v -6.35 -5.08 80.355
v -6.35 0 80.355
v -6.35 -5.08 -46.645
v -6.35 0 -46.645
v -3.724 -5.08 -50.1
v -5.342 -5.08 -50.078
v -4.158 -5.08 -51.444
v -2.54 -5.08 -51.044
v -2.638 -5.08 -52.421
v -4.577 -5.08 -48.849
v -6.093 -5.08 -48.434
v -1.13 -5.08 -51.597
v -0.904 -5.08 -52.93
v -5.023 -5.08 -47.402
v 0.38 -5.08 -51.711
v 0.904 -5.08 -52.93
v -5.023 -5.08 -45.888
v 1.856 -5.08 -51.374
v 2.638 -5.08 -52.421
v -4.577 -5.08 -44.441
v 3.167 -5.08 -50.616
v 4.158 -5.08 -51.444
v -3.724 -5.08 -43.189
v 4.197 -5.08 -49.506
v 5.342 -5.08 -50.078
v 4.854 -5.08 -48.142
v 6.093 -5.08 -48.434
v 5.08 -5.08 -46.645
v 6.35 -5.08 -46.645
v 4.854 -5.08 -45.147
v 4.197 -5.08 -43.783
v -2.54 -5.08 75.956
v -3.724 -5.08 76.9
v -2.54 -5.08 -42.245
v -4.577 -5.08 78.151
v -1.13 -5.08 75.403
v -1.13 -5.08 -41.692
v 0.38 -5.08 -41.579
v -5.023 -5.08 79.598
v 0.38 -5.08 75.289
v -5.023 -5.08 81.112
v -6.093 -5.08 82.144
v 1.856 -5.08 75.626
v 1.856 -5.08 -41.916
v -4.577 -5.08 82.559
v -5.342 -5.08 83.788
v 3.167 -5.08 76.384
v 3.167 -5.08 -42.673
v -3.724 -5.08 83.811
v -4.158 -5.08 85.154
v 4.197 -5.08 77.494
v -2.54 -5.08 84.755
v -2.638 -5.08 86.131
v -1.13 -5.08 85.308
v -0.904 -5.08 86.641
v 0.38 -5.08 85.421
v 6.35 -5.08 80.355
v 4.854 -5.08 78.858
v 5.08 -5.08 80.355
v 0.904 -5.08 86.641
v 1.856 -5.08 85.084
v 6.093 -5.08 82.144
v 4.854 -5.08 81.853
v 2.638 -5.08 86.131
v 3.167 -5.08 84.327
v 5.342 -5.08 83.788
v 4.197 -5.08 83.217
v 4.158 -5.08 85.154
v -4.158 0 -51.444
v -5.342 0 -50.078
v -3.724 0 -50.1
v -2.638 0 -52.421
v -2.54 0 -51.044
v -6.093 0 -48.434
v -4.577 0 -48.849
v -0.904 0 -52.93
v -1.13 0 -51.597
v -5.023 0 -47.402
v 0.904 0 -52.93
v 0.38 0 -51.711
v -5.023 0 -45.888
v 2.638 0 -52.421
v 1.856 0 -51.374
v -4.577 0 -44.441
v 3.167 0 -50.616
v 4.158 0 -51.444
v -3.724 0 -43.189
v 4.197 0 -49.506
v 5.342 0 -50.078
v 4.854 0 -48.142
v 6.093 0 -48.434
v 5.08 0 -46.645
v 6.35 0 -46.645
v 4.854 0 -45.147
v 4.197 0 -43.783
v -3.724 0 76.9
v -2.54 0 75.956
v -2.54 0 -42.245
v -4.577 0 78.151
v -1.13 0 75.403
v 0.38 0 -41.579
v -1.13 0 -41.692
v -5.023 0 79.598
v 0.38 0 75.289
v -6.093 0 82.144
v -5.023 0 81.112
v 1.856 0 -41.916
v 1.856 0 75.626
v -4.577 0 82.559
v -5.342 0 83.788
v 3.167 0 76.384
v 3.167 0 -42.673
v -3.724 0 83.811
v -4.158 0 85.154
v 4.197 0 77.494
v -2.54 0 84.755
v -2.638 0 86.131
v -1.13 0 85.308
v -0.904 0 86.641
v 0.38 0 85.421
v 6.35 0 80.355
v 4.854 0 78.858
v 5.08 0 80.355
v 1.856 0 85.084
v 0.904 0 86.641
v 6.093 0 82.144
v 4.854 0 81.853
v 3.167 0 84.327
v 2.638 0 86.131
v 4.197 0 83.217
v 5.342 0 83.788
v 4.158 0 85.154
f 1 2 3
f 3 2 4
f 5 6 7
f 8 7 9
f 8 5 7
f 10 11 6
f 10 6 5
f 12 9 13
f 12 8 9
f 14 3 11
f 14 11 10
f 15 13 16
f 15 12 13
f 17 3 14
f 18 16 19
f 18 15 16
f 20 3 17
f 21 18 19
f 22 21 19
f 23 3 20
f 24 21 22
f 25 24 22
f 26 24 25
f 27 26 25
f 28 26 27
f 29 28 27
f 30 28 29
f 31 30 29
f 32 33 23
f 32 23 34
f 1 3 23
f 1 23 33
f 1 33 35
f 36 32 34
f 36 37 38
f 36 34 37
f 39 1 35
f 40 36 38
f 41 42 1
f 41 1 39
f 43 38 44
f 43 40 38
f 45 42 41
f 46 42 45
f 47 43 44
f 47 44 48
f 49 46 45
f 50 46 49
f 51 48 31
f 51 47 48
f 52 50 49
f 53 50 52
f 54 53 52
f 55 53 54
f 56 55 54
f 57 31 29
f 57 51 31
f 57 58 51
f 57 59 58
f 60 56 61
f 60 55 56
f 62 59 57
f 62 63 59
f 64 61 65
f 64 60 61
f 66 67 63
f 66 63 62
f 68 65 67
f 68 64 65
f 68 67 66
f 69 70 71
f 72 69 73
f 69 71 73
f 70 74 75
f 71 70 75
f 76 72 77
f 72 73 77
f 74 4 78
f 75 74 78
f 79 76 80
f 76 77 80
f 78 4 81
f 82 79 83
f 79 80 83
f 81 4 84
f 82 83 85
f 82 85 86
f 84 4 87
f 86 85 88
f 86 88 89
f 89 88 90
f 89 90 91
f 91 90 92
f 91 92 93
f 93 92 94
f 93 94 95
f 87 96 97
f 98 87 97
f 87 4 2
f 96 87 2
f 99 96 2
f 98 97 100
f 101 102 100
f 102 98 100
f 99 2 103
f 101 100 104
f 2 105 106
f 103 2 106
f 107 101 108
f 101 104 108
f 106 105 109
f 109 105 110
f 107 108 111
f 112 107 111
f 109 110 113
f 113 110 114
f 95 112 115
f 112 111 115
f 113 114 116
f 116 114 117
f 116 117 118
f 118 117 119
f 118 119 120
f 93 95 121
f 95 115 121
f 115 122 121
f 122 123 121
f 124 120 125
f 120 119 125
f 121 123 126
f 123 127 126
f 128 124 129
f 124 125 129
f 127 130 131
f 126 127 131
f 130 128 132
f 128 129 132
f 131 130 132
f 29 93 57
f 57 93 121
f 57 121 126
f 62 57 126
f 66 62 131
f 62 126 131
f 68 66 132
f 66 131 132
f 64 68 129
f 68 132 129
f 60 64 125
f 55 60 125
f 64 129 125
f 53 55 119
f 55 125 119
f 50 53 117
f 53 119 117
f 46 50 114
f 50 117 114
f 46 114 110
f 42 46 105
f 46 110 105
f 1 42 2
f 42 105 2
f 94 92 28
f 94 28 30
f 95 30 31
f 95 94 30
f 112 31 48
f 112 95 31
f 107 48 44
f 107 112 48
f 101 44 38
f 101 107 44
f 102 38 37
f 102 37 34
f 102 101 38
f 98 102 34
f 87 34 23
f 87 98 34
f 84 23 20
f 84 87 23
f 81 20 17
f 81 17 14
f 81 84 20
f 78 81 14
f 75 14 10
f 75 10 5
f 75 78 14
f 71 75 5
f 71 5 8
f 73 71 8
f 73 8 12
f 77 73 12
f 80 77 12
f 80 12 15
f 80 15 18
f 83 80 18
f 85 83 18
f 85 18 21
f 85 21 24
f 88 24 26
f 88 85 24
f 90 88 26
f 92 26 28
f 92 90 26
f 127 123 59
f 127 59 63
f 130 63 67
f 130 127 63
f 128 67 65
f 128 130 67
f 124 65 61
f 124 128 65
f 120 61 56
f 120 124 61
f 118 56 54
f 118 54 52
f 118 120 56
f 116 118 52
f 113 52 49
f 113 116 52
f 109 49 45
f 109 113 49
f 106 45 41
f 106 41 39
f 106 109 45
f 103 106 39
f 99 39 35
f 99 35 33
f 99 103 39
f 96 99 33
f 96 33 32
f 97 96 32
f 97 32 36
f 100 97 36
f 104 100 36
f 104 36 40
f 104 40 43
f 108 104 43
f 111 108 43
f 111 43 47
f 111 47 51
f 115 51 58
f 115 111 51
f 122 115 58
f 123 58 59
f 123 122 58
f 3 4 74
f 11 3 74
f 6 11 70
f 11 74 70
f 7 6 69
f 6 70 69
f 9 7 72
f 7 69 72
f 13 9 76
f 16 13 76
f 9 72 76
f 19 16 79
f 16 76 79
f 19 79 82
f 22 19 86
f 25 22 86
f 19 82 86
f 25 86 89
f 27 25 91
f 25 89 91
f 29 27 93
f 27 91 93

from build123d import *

# Parameters (mm, degrees)
F0_R     = 5.08
F1_DEPTH = 5.08


with BuildPart() as f1:
    # F0 (on Front) → F1 (new body)
    with BuildSketch(Plane.XZ):
        with BuildLine():
            Line((6.35, -46.644763), (6.35, 80.355237))
            ThreePointArc((6.35, 80.355237), (0, 74.005237), (-6.35, 80.355237))
            Line((-6.35, 80.355237), (-6.35, -46.644763))
            ThreePointArc((-6.35, -46.644763), (0, -40.294763), (6.35, -46.644763))
        make_face()
        with BuildLine():
            ThreePointArc((-6.35, 80.355237), (0, 74.005237), (6.35, 80.355237))
            ThreePointArc((6.35, 80.355237), (0, 86.705237), (-6.35, 80.355237))
        make_face()
        with Locations((0, 80.355237)):
            Circle(F0_R, mode=Mode.SUBTRACT)
        with BuildLine():
            ThreePointArc((-6.35, -46.644763), (0, -52.994763), (6.35, -46.644763))
            ThreePointArc((6.35, -46.644763), (0, -40.294763), (-6.35, -46.644763))
        make_face()
        with Locations((0, -46.644763)):
            Circle(F0_R, mode=Mode.SUBTRACT)
    extrude(amount=F1_DEPTH)


solid = f1.part
